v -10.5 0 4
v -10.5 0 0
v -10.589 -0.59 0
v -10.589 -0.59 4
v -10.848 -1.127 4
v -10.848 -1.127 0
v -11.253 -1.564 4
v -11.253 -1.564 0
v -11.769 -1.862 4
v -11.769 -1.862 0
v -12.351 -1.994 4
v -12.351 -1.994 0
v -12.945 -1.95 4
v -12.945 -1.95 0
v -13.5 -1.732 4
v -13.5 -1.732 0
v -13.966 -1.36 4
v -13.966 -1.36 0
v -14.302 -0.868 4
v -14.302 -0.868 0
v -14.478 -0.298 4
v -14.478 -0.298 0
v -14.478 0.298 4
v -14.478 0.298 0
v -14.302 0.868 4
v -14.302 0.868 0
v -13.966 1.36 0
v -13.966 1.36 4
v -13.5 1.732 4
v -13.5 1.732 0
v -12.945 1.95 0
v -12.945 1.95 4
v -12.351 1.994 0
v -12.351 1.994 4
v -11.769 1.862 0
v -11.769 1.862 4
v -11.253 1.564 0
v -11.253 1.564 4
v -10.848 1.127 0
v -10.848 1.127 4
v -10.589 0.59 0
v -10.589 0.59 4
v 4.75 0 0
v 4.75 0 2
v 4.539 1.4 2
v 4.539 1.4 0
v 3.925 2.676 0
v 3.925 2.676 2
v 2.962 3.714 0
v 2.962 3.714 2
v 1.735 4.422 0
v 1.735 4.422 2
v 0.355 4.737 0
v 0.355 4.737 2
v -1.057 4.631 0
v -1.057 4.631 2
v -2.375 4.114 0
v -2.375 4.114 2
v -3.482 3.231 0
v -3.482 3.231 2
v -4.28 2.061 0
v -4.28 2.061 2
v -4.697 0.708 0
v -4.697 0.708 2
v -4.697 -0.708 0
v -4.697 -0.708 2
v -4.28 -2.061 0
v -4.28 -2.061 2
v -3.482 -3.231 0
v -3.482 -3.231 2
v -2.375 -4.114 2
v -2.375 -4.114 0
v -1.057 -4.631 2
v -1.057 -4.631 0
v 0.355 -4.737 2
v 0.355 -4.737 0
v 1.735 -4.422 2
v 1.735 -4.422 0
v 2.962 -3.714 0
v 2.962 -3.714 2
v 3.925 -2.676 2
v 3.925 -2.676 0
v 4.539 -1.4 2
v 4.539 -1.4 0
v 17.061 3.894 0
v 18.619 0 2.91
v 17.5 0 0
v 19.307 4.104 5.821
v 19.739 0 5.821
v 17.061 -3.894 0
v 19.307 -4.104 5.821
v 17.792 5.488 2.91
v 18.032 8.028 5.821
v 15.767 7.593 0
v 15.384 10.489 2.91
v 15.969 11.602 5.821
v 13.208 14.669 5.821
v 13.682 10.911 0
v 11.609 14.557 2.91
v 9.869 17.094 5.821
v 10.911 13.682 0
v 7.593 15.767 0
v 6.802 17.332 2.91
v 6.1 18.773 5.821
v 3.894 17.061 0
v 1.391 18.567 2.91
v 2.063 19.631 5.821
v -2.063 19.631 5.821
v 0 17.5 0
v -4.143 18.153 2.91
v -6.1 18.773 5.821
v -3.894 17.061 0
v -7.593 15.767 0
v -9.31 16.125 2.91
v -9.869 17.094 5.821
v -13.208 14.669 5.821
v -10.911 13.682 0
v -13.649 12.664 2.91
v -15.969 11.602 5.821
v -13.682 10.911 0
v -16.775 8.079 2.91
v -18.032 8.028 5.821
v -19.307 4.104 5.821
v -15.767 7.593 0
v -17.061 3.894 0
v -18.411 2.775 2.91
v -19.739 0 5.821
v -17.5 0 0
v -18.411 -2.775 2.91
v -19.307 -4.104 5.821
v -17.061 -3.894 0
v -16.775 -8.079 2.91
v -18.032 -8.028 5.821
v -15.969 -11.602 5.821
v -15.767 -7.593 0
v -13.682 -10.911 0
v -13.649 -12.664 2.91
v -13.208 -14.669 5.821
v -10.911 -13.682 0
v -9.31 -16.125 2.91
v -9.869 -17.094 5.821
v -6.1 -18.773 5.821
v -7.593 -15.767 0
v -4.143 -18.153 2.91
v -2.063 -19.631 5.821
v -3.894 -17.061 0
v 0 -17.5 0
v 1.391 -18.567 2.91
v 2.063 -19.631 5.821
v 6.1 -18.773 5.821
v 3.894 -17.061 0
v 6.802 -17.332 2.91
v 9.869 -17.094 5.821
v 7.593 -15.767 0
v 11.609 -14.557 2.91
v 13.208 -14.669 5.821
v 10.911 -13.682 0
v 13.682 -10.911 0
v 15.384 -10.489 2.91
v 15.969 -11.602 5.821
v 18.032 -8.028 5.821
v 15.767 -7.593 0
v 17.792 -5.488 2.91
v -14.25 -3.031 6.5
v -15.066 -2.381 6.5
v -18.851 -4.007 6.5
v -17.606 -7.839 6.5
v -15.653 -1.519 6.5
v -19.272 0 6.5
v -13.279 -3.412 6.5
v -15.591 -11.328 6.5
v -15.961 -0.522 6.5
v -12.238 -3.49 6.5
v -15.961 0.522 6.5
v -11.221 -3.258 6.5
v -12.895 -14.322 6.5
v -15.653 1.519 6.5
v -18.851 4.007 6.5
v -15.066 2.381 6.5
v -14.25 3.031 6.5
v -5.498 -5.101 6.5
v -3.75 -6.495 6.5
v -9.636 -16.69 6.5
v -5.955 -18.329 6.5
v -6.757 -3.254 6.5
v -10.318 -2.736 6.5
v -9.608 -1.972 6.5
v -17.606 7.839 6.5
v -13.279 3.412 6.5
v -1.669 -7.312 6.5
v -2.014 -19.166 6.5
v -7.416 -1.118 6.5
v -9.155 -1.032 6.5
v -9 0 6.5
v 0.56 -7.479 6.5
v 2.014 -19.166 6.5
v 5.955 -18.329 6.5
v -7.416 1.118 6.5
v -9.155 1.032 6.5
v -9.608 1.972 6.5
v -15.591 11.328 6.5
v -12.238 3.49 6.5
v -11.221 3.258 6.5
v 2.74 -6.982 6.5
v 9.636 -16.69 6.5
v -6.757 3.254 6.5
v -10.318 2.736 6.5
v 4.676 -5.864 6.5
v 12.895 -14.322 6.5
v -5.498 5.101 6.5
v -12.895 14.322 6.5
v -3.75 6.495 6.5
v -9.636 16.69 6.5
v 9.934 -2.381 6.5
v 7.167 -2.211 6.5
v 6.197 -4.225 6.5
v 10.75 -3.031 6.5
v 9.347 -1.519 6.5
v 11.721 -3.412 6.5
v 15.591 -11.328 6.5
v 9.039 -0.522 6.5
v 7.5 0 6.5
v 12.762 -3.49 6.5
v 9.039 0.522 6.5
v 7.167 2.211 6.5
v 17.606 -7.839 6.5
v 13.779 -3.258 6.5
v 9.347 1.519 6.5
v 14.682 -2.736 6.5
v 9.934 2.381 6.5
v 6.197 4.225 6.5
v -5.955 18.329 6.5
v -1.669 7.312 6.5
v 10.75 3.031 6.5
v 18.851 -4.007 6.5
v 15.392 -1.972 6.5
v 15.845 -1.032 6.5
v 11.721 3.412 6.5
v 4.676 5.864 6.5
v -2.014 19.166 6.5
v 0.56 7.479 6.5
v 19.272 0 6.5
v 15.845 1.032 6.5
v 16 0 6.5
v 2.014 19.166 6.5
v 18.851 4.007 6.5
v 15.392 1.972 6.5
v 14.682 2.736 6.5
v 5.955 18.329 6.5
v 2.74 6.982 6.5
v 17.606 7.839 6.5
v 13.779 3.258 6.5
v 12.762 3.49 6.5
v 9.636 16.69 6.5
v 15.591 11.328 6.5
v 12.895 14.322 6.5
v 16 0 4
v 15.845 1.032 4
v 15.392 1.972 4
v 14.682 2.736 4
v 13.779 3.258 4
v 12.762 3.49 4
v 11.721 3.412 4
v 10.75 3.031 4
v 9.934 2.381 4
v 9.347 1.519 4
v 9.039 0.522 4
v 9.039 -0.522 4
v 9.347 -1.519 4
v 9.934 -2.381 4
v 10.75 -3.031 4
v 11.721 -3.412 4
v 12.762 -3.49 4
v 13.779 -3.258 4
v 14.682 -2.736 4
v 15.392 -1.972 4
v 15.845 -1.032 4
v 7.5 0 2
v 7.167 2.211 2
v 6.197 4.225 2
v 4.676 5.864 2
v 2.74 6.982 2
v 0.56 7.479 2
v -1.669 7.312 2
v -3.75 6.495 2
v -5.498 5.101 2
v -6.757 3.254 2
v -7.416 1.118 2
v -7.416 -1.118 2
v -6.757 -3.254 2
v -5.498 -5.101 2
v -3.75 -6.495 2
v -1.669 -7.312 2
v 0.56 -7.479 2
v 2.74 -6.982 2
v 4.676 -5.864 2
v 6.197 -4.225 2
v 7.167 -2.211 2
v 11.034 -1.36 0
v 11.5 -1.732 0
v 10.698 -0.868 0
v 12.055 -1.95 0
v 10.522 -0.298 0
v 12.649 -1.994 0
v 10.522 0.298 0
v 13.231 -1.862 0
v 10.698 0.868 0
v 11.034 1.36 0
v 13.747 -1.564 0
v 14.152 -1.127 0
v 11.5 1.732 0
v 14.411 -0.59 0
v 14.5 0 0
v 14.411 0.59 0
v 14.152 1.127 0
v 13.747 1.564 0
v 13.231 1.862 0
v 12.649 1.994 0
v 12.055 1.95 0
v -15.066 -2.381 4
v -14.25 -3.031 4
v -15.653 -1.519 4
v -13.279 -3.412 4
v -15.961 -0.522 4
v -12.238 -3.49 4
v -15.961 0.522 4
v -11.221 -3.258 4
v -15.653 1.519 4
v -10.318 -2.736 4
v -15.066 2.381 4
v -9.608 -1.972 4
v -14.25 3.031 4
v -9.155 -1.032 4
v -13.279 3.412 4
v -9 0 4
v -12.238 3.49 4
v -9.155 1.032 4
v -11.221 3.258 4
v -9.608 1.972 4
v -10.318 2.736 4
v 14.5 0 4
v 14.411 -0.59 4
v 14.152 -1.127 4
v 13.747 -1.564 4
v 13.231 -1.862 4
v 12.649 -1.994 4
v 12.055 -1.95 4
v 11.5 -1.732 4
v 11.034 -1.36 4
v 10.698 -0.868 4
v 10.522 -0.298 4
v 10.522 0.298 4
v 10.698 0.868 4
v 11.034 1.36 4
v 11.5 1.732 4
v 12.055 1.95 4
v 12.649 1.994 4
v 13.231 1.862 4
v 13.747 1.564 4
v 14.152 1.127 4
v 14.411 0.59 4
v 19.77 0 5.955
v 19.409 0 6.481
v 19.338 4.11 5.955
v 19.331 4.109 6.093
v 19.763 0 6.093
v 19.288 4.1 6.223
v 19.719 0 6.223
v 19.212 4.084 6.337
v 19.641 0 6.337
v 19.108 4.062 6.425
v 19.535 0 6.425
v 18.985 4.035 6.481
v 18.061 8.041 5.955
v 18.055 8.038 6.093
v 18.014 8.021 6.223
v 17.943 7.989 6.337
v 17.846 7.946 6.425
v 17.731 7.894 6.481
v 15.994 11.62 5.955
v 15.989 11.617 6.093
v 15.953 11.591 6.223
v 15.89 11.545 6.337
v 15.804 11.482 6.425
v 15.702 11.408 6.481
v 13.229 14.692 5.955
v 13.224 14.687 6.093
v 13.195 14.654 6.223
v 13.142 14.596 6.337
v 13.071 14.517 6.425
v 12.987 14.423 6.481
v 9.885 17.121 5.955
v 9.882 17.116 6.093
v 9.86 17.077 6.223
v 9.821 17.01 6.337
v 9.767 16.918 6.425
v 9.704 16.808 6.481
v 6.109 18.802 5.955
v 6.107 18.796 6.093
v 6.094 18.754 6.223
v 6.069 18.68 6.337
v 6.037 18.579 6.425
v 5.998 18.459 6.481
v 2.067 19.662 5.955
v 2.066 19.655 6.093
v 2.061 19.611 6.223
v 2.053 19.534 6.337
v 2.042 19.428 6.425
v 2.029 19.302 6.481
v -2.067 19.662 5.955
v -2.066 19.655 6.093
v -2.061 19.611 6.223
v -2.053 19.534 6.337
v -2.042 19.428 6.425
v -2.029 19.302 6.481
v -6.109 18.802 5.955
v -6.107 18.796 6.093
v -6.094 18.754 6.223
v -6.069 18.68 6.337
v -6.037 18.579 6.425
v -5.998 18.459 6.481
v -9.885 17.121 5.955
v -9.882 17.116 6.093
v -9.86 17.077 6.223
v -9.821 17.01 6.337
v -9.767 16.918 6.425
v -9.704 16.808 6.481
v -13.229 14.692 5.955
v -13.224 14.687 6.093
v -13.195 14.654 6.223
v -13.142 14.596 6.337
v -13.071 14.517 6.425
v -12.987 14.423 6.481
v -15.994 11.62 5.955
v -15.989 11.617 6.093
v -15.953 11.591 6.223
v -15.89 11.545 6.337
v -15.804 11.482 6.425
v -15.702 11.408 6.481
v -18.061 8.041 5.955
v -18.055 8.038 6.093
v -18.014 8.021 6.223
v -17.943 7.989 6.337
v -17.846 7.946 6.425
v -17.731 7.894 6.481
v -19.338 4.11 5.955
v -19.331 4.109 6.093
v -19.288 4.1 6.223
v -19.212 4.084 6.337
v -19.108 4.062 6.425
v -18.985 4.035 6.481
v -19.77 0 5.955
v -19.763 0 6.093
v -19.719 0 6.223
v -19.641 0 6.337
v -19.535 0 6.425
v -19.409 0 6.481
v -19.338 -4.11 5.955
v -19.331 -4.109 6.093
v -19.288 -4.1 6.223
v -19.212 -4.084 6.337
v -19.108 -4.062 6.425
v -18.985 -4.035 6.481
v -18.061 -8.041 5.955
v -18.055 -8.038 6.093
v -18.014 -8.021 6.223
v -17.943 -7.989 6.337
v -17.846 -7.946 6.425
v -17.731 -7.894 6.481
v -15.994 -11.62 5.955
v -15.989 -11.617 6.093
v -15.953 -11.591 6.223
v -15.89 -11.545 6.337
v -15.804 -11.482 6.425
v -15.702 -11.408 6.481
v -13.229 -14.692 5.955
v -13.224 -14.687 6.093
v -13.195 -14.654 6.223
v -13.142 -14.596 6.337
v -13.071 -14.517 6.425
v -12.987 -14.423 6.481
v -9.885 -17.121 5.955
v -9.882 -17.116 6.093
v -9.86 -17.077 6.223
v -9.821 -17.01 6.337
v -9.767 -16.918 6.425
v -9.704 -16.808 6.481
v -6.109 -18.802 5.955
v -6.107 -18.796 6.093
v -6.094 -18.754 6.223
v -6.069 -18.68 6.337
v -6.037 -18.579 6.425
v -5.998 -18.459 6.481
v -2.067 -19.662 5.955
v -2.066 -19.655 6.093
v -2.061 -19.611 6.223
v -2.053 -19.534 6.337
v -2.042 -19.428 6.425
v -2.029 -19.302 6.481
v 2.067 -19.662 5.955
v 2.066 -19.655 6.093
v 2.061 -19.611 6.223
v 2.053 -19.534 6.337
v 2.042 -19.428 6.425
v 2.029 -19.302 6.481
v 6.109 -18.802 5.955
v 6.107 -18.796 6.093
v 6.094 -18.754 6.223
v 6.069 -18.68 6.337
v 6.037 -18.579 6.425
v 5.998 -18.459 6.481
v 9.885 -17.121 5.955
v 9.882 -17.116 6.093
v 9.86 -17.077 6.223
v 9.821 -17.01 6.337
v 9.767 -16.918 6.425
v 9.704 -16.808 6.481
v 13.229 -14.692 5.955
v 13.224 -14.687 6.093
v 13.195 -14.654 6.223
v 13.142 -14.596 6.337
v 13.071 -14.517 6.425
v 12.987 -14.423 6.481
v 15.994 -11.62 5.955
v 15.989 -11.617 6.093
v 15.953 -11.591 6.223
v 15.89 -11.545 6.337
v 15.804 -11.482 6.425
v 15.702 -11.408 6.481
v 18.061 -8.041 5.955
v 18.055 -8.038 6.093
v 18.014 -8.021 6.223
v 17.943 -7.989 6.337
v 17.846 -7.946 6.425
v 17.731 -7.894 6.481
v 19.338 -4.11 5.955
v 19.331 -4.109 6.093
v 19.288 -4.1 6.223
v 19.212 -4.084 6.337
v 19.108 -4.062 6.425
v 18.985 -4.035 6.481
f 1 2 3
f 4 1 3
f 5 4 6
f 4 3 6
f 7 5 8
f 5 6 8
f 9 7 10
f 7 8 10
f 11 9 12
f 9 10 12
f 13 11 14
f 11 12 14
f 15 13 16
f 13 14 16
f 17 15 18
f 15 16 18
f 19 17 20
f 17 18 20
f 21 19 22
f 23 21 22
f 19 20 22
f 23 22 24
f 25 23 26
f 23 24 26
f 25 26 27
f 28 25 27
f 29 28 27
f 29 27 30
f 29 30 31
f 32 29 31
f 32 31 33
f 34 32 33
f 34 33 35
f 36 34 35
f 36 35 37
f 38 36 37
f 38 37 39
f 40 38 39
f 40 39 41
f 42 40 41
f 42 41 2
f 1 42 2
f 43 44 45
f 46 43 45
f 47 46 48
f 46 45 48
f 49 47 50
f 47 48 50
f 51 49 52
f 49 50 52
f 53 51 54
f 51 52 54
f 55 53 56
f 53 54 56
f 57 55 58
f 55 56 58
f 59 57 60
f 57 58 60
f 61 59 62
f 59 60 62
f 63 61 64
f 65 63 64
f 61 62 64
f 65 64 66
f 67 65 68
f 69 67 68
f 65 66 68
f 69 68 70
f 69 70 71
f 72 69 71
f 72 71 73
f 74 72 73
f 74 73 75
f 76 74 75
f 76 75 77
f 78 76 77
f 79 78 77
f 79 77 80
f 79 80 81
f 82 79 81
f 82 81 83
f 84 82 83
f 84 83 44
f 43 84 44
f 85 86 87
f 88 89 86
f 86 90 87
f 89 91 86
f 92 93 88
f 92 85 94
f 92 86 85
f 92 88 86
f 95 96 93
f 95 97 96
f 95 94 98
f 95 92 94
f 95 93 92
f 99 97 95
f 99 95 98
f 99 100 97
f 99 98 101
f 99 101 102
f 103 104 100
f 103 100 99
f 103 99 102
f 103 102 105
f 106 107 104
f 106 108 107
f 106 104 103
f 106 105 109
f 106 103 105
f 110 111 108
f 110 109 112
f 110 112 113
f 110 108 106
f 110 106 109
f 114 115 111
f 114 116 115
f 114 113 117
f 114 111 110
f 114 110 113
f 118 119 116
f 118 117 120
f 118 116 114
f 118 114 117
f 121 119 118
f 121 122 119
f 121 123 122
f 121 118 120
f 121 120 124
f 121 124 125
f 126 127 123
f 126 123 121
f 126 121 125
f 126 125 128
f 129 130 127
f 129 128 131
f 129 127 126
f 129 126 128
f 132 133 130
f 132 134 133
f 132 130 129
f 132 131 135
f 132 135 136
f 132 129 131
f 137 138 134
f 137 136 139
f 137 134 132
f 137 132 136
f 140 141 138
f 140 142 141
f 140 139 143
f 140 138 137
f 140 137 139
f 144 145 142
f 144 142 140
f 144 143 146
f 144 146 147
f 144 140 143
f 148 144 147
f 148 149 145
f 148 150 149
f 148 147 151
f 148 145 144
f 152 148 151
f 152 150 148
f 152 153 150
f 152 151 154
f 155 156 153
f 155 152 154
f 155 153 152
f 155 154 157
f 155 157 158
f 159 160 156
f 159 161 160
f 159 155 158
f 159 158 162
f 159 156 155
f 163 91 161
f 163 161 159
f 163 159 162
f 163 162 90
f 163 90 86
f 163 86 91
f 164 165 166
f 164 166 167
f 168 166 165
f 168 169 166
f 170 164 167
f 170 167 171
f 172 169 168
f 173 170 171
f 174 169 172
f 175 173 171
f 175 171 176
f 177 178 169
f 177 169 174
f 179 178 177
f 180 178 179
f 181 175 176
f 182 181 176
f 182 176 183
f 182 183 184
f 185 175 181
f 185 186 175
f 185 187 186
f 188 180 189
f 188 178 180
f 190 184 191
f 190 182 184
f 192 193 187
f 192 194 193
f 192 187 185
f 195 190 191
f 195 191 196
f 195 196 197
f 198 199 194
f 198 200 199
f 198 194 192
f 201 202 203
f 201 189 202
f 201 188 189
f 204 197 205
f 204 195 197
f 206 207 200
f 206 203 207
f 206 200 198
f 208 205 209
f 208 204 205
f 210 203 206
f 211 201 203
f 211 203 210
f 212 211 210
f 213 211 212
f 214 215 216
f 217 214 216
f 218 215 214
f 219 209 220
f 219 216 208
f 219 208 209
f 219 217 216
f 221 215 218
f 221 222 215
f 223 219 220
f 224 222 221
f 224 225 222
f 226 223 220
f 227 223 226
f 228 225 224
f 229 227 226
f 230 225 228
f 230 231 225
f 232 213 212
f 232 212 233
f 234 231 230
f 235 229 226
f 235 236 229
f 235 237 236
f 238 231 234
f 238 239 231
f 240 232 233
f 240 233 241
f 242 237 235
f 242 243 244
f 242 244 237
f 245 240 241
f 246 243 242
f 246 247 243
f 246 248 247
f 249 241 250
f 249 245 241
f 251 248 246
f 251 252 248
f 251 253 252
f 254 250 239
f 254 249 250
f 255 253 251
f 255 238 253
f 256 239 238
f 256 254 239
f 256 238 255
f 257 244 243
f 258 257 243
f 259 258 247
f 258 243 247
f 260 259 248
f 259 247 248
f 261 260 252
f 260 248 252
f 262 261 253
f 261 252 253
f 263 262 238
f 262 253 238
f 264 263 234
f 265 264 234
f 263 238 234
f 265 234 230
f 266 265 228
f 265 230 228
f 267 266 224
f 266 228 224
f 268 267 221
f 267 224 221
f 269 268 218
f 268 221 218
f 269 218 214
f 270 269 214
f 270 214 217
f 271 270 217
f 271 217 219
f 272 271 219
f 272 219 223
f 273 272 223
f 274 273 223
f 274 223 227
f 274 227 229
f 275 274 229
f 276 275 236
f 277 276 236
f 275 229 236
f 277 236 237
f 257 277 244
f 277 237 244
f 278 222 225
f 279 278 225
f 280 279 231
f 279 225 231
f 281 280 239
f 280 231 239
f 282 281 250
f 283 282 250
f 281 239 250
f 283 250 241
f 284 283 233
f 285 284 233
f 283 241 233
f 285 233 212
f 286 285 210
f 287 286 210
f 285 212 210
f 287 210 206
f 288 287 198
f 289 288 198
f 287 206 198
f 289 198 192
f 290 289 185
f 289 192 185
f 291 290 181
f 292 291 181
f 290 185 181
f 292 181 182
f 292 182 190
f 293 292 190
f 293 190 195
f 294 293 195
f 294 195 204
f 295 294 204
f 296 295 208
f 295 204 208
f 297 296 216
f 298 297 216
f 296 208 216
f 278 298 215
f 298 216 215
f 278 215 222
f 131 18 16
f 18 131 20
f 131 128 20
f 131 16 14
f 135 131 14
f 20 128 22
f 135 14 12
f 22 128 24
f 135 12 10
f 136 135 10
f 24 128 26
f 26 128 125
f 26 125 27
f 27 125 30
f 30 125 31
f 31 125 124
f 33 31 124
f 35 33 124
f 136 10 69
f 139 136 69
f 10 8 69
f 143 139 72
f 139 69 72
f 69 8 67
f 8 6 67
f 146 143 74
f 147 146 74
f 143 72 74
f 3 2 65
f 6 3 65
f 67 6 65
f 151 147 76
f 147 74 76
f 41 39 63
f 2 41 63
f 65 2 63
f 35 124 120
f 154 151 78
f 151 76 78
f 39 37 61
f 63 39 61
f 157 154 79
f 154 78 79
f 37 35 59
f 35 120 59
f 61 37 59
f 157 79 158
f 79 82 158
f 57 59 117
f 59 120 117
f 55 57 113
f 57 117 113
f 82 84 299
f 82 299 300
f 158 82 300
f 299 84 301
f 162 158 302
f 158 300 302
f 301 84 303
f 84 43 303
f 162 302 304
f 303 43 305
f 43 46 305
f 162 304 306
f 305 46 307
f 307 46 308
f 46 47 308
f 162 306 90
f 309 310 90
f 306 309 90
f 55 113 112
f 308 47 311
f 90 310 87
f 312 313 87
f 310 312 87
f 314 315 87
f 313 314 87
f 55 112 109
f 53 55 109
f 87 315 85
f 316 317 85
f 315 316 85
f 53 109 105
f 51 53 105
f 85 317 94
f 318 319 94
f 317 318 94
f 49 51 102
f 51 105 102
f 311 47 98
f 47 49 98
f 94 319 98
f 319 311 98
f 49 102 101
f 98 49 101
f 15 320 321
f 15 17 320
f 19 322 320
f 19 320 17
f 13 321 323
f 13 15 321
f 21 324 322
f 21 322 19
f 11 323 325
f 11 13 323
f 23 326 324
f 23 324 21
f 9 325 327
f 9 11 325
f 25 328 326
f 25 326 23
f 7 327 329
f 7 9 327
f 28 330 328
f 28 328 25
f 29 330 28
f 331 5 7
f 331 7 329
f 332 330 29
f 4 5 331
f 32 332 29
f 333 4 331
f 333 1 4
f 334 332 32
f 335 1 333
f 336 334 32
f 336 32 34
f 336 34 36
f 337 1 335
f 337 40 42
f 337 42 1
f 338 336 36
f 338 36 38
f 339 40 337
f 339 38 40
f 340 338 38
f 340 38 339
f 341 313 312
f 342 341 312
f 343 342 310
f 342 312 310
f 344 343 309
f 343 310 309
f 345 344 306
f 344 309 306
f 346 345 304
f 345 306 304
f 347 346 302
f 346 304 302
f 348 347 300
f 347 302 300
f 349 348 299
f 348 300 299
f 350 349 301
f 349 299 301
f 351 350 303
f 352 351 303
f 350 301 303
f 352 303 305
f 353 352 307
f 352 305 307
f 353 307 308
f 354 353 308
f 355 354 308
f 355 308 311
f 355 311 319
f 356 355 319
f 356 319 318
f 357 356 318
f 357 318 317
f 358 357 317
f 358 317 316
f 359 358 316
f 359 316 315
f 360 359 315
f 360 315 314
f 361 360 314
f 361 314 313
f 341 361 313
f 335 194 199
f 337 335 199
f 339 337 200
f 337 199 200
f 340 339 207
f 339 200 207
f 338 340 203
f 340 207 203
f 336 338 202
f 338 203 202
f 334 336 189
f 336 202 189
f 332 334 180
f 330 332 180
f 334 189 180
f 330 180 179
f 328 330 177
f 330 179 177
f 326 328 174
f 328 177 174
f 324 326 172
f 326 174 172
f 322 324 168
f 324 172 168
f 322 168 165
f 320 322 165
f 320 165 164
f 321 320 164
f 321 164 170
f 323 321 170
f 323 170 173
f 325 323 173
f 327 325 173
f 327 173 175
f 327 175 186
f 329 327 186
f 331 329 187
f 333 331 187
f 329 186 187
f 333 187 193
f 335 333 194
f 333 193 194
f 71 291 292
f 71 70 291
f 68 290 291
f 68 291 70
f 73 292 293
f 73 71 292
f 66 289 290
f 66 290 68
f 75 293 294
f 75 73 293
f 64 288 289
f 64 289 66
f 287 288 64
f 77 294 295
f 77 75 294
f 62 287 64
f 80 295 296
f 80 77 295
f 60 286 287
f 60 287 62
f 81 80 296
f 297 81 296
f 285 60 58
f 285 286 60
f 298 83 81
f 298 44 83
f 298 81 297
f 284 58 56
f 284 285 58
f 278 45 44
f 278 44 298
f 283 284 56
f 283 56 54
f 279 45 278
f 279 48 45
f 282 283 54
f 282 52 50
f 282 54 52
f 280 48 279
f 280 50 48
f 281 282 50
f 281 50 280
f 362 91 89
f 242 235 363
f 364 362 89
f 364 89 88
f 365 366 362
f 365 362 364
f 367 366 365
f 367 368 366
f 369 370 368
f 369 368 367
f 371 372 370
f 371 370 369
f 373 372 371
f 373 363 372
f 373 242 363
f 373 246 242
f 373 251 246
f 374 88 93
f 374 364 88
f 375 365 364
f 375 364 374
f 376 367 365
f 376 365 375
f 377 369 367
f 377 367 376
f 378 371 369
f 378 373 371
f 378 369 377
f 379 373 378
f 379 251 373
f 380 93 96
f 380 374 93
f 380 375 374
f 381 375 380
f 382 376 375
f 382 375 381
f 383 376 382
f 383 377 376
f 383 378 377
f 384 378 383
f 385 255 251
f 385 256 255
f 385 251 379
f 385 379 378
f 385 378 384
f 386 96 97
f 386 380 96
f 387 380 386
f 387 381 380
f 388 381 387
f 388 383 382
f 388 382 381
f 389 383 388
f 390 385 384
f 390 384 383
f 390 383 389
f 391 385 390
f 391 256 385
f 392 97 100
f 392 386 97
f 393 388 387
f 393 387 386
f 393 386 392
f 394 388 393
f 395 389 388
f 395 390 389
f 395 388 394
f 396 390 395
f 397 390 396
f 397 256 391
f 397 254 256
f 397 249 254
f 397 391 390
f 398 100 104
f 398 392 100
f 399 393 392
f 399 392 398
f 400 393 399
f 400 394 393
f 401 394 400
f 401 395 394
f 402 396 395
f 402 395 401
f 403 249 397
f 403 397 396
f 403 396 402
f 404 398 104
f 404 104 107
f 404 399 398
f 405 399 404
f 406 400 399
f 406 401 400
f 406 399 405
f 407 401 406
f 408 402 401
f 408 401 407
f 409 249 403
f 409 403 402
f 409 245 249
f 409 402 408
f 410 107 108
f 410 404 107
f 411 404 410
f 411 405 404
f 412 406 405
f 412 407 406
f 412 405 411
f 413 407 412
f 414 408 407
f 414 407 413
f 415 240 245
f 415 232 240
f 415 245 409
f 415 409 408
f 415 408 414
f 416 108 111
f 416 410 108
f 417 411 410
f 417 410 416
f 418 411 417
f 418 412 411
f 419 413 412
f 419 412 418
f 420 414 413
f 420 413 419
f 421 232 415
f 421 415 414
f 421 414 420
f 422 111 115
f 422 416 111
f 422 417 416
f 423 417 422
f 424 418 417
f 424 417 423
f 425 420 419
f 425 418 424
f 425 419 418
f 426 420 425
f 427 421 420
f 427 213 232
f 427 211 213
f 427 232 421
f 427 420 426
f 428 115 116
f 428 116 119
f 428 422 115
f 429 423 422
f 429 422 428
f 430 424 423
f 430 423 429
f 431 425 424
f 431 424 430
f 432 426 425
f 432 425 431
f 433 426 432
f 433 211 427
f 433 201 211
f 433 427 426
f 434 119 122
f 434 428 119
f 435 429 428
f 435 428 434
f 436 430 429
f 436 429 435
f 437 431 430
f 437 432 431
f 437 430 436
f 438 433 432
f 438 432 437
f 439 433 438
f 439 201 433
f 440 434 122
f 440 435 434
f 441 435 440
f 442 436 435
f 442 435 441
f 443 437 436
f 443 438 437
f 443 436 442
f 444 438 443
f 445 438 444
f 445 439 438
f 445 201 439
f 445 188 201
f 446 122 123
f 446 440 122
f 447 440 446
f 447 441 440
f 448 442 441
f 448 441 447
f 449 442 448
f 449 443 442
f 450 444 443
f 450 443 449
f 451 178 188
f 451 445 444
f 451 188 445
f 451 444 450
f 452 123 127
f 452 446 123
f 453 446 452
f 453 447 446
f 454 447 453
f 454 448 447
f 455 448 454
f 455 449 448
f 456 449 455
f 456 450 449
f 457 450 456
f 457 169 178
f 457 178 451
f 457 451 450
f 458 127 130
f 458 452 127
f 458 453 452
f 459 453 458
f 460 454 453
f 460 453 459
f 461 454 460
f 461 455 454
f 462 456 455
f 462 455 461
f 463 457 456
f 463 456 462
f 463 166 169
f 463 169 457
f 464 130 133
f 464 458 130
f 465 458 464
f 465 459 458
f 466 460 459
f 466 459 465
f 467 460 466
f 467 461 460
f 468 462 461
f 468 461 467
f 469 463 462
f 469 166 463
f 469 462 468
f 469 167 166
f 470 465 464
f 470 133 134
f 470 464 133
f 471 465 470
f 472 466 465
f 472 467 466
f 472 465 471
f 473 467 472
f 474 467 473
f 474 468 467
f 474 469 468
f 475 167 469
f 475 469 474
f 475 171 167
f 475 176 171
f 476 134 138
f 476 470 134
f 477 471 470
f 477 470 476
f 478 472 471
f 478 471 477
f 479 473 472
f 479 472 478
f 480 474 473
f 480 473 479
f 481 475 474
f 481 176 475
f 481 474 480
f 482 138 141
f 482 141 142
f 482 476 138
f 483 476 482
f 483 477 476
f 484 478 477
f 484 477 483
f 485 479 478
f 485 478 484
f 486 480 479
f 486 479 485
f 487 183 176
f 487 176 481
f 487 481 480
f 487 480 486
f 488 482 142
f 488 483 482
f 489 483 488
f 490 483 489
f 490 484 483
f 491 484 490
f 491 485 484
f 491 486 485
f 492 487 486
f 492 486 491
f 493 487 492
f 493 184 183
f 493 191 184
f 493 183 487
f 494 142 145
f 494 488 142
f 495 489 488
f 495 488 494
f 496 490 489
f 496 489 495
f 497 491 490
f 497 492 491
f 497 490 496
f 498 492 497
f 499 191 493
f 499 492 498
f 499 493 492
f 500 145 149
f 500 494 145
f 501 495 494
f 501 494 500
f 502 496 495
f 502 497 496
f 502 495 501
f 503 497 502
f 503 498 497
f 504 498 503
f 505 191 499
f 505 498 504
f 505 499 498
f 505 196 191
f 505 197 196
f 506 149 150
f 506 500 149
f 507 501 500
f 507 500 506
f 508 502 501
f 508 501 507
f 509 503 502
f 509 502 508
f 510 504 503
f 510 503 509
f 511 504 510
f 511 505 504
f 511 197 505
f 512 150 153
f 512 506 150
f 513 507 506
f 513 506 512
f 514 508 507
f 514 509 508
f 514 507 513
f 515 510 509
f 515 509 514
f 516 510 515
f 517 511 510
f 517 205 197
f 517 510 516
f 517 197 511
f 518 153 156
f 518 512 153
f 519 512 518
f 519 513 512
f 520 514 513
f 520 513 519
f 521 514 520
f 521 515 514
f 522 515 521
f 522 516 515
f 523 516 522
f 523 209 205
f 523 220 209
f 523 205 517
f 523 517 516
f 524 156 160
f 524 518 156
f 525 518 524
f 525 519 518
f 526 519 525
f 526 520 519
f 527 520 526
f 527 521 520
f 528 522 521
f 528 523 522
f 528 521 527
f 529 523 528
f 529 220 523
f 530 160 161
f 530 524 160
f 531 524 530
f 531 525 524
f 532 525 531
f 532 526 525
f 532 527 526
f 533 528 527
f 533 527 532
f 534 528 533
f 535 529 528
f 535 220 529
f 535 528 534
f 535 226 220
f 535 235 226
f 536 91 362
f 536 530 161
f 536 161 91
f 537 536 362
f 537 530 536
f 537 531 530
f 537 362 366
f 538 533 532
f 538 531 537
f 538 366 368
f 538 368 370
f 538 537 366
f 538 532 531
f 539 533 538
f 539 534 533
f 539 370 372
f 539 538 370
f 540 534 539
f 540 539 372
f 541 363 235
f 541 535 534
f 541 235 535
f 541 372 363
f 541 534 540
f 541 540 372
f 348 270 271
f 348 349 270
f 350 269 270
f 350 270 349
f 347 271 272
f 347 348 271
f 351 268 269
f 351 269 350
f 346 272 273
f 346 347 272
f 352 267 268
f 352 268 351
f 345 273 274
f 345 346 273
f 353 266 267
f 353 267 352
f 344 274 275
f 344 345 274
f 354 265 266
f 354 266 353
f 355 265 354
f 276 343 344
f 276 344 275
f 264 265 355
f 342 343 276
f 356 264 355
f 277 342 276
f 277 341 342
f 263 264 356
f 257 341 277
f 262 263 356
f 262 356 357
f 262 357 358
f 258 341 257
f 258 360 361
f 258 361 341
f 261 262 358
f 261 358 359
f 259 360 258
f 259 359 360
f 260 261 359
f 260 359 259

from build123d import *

# Parameters (mm, degrees)
SKETCH_R        = 17.5
SKETCH001_R     = 20
SKETCH002_R     = 4.75
POCKET_DEPTH    = 6.501
SKETCH003_R     = 2
POCKET001_DEPTH = 6.501
SKETCH004_R     = 3.5
POCKET002_DEPTH = 2.5
FILLET_R        = 0.5
SKETCH005_R     = 7.5
POCKET003_DEPTH = 4.5


with BuildPart() as part:
    # Sketch (on XY_Plane of Origin) → AdditiveLoft section 0
    with BuildSketch(Plane.XY):
        Circle(SKETCH_R)
    # Sketch001 (on Sketch) → AdditiveLoft section 1
    with BuildSketch(Plane.XY.offset(6.5)):
        Circle(SKETCH001_R)
    loft()

    # Sketch002 (on Face3 of AdditiveLoft) → Pocket (cut, through all)
    with BuildSketch(Plane.XY.offset(6.5)):
        Circle(SKETCH002_R)
    extrude(amount=-POCKET_DEPTH, mode=Mode.SUBTRACT)

    # Sketch003 (on Face1 of Pocket) → Pocket001 (cut, through all)
    with BuildSketch(Plane(origin=(0, 0, 0), x_dir=(1, 0, 0), z_dir=(0, 0, -1))):
        with Locations((-12.5, 0)):
            Circle(SKETCH003_R)
        with Locations((12.5, 0)):
            Circle(SKETCH003_R)
    extrude(amount=-POCKET001_DEPTH, mode=Mode.SUBTRACT)

    # Sketch004 (on Face6 of Pocket001) → Pocket002 (cut)
    with BuildSketch(Plane.XY.offset(6.5)):
        with Locations((-12.5, 0)):
            Circle(SKETCH004_R)
        with Locations((12.5, 0)):
            Circle(SKETCH004_R)
    extrude(amount=-POCKET002_DEPTH, mode=Mode.SUBTRACT)

    # Fillet
    fillet_edges = [part.edges().sort_by_distance(p)[0] for p in [
        (-20, 0, 6.5),
    ]]
    fillet(fillet_edges, radius=FILLET_R)

    # Sketch005 (on Face4 of Fillet) → Pocket003 (cut)
    with BuildSketch(Plane.XY.offset(6.5)):
        Circle(SKETCH005_R)
    extrude(amount=-POCKET003_DEPTH, mode=Mode.SUBTRACT)


solid = part.part
